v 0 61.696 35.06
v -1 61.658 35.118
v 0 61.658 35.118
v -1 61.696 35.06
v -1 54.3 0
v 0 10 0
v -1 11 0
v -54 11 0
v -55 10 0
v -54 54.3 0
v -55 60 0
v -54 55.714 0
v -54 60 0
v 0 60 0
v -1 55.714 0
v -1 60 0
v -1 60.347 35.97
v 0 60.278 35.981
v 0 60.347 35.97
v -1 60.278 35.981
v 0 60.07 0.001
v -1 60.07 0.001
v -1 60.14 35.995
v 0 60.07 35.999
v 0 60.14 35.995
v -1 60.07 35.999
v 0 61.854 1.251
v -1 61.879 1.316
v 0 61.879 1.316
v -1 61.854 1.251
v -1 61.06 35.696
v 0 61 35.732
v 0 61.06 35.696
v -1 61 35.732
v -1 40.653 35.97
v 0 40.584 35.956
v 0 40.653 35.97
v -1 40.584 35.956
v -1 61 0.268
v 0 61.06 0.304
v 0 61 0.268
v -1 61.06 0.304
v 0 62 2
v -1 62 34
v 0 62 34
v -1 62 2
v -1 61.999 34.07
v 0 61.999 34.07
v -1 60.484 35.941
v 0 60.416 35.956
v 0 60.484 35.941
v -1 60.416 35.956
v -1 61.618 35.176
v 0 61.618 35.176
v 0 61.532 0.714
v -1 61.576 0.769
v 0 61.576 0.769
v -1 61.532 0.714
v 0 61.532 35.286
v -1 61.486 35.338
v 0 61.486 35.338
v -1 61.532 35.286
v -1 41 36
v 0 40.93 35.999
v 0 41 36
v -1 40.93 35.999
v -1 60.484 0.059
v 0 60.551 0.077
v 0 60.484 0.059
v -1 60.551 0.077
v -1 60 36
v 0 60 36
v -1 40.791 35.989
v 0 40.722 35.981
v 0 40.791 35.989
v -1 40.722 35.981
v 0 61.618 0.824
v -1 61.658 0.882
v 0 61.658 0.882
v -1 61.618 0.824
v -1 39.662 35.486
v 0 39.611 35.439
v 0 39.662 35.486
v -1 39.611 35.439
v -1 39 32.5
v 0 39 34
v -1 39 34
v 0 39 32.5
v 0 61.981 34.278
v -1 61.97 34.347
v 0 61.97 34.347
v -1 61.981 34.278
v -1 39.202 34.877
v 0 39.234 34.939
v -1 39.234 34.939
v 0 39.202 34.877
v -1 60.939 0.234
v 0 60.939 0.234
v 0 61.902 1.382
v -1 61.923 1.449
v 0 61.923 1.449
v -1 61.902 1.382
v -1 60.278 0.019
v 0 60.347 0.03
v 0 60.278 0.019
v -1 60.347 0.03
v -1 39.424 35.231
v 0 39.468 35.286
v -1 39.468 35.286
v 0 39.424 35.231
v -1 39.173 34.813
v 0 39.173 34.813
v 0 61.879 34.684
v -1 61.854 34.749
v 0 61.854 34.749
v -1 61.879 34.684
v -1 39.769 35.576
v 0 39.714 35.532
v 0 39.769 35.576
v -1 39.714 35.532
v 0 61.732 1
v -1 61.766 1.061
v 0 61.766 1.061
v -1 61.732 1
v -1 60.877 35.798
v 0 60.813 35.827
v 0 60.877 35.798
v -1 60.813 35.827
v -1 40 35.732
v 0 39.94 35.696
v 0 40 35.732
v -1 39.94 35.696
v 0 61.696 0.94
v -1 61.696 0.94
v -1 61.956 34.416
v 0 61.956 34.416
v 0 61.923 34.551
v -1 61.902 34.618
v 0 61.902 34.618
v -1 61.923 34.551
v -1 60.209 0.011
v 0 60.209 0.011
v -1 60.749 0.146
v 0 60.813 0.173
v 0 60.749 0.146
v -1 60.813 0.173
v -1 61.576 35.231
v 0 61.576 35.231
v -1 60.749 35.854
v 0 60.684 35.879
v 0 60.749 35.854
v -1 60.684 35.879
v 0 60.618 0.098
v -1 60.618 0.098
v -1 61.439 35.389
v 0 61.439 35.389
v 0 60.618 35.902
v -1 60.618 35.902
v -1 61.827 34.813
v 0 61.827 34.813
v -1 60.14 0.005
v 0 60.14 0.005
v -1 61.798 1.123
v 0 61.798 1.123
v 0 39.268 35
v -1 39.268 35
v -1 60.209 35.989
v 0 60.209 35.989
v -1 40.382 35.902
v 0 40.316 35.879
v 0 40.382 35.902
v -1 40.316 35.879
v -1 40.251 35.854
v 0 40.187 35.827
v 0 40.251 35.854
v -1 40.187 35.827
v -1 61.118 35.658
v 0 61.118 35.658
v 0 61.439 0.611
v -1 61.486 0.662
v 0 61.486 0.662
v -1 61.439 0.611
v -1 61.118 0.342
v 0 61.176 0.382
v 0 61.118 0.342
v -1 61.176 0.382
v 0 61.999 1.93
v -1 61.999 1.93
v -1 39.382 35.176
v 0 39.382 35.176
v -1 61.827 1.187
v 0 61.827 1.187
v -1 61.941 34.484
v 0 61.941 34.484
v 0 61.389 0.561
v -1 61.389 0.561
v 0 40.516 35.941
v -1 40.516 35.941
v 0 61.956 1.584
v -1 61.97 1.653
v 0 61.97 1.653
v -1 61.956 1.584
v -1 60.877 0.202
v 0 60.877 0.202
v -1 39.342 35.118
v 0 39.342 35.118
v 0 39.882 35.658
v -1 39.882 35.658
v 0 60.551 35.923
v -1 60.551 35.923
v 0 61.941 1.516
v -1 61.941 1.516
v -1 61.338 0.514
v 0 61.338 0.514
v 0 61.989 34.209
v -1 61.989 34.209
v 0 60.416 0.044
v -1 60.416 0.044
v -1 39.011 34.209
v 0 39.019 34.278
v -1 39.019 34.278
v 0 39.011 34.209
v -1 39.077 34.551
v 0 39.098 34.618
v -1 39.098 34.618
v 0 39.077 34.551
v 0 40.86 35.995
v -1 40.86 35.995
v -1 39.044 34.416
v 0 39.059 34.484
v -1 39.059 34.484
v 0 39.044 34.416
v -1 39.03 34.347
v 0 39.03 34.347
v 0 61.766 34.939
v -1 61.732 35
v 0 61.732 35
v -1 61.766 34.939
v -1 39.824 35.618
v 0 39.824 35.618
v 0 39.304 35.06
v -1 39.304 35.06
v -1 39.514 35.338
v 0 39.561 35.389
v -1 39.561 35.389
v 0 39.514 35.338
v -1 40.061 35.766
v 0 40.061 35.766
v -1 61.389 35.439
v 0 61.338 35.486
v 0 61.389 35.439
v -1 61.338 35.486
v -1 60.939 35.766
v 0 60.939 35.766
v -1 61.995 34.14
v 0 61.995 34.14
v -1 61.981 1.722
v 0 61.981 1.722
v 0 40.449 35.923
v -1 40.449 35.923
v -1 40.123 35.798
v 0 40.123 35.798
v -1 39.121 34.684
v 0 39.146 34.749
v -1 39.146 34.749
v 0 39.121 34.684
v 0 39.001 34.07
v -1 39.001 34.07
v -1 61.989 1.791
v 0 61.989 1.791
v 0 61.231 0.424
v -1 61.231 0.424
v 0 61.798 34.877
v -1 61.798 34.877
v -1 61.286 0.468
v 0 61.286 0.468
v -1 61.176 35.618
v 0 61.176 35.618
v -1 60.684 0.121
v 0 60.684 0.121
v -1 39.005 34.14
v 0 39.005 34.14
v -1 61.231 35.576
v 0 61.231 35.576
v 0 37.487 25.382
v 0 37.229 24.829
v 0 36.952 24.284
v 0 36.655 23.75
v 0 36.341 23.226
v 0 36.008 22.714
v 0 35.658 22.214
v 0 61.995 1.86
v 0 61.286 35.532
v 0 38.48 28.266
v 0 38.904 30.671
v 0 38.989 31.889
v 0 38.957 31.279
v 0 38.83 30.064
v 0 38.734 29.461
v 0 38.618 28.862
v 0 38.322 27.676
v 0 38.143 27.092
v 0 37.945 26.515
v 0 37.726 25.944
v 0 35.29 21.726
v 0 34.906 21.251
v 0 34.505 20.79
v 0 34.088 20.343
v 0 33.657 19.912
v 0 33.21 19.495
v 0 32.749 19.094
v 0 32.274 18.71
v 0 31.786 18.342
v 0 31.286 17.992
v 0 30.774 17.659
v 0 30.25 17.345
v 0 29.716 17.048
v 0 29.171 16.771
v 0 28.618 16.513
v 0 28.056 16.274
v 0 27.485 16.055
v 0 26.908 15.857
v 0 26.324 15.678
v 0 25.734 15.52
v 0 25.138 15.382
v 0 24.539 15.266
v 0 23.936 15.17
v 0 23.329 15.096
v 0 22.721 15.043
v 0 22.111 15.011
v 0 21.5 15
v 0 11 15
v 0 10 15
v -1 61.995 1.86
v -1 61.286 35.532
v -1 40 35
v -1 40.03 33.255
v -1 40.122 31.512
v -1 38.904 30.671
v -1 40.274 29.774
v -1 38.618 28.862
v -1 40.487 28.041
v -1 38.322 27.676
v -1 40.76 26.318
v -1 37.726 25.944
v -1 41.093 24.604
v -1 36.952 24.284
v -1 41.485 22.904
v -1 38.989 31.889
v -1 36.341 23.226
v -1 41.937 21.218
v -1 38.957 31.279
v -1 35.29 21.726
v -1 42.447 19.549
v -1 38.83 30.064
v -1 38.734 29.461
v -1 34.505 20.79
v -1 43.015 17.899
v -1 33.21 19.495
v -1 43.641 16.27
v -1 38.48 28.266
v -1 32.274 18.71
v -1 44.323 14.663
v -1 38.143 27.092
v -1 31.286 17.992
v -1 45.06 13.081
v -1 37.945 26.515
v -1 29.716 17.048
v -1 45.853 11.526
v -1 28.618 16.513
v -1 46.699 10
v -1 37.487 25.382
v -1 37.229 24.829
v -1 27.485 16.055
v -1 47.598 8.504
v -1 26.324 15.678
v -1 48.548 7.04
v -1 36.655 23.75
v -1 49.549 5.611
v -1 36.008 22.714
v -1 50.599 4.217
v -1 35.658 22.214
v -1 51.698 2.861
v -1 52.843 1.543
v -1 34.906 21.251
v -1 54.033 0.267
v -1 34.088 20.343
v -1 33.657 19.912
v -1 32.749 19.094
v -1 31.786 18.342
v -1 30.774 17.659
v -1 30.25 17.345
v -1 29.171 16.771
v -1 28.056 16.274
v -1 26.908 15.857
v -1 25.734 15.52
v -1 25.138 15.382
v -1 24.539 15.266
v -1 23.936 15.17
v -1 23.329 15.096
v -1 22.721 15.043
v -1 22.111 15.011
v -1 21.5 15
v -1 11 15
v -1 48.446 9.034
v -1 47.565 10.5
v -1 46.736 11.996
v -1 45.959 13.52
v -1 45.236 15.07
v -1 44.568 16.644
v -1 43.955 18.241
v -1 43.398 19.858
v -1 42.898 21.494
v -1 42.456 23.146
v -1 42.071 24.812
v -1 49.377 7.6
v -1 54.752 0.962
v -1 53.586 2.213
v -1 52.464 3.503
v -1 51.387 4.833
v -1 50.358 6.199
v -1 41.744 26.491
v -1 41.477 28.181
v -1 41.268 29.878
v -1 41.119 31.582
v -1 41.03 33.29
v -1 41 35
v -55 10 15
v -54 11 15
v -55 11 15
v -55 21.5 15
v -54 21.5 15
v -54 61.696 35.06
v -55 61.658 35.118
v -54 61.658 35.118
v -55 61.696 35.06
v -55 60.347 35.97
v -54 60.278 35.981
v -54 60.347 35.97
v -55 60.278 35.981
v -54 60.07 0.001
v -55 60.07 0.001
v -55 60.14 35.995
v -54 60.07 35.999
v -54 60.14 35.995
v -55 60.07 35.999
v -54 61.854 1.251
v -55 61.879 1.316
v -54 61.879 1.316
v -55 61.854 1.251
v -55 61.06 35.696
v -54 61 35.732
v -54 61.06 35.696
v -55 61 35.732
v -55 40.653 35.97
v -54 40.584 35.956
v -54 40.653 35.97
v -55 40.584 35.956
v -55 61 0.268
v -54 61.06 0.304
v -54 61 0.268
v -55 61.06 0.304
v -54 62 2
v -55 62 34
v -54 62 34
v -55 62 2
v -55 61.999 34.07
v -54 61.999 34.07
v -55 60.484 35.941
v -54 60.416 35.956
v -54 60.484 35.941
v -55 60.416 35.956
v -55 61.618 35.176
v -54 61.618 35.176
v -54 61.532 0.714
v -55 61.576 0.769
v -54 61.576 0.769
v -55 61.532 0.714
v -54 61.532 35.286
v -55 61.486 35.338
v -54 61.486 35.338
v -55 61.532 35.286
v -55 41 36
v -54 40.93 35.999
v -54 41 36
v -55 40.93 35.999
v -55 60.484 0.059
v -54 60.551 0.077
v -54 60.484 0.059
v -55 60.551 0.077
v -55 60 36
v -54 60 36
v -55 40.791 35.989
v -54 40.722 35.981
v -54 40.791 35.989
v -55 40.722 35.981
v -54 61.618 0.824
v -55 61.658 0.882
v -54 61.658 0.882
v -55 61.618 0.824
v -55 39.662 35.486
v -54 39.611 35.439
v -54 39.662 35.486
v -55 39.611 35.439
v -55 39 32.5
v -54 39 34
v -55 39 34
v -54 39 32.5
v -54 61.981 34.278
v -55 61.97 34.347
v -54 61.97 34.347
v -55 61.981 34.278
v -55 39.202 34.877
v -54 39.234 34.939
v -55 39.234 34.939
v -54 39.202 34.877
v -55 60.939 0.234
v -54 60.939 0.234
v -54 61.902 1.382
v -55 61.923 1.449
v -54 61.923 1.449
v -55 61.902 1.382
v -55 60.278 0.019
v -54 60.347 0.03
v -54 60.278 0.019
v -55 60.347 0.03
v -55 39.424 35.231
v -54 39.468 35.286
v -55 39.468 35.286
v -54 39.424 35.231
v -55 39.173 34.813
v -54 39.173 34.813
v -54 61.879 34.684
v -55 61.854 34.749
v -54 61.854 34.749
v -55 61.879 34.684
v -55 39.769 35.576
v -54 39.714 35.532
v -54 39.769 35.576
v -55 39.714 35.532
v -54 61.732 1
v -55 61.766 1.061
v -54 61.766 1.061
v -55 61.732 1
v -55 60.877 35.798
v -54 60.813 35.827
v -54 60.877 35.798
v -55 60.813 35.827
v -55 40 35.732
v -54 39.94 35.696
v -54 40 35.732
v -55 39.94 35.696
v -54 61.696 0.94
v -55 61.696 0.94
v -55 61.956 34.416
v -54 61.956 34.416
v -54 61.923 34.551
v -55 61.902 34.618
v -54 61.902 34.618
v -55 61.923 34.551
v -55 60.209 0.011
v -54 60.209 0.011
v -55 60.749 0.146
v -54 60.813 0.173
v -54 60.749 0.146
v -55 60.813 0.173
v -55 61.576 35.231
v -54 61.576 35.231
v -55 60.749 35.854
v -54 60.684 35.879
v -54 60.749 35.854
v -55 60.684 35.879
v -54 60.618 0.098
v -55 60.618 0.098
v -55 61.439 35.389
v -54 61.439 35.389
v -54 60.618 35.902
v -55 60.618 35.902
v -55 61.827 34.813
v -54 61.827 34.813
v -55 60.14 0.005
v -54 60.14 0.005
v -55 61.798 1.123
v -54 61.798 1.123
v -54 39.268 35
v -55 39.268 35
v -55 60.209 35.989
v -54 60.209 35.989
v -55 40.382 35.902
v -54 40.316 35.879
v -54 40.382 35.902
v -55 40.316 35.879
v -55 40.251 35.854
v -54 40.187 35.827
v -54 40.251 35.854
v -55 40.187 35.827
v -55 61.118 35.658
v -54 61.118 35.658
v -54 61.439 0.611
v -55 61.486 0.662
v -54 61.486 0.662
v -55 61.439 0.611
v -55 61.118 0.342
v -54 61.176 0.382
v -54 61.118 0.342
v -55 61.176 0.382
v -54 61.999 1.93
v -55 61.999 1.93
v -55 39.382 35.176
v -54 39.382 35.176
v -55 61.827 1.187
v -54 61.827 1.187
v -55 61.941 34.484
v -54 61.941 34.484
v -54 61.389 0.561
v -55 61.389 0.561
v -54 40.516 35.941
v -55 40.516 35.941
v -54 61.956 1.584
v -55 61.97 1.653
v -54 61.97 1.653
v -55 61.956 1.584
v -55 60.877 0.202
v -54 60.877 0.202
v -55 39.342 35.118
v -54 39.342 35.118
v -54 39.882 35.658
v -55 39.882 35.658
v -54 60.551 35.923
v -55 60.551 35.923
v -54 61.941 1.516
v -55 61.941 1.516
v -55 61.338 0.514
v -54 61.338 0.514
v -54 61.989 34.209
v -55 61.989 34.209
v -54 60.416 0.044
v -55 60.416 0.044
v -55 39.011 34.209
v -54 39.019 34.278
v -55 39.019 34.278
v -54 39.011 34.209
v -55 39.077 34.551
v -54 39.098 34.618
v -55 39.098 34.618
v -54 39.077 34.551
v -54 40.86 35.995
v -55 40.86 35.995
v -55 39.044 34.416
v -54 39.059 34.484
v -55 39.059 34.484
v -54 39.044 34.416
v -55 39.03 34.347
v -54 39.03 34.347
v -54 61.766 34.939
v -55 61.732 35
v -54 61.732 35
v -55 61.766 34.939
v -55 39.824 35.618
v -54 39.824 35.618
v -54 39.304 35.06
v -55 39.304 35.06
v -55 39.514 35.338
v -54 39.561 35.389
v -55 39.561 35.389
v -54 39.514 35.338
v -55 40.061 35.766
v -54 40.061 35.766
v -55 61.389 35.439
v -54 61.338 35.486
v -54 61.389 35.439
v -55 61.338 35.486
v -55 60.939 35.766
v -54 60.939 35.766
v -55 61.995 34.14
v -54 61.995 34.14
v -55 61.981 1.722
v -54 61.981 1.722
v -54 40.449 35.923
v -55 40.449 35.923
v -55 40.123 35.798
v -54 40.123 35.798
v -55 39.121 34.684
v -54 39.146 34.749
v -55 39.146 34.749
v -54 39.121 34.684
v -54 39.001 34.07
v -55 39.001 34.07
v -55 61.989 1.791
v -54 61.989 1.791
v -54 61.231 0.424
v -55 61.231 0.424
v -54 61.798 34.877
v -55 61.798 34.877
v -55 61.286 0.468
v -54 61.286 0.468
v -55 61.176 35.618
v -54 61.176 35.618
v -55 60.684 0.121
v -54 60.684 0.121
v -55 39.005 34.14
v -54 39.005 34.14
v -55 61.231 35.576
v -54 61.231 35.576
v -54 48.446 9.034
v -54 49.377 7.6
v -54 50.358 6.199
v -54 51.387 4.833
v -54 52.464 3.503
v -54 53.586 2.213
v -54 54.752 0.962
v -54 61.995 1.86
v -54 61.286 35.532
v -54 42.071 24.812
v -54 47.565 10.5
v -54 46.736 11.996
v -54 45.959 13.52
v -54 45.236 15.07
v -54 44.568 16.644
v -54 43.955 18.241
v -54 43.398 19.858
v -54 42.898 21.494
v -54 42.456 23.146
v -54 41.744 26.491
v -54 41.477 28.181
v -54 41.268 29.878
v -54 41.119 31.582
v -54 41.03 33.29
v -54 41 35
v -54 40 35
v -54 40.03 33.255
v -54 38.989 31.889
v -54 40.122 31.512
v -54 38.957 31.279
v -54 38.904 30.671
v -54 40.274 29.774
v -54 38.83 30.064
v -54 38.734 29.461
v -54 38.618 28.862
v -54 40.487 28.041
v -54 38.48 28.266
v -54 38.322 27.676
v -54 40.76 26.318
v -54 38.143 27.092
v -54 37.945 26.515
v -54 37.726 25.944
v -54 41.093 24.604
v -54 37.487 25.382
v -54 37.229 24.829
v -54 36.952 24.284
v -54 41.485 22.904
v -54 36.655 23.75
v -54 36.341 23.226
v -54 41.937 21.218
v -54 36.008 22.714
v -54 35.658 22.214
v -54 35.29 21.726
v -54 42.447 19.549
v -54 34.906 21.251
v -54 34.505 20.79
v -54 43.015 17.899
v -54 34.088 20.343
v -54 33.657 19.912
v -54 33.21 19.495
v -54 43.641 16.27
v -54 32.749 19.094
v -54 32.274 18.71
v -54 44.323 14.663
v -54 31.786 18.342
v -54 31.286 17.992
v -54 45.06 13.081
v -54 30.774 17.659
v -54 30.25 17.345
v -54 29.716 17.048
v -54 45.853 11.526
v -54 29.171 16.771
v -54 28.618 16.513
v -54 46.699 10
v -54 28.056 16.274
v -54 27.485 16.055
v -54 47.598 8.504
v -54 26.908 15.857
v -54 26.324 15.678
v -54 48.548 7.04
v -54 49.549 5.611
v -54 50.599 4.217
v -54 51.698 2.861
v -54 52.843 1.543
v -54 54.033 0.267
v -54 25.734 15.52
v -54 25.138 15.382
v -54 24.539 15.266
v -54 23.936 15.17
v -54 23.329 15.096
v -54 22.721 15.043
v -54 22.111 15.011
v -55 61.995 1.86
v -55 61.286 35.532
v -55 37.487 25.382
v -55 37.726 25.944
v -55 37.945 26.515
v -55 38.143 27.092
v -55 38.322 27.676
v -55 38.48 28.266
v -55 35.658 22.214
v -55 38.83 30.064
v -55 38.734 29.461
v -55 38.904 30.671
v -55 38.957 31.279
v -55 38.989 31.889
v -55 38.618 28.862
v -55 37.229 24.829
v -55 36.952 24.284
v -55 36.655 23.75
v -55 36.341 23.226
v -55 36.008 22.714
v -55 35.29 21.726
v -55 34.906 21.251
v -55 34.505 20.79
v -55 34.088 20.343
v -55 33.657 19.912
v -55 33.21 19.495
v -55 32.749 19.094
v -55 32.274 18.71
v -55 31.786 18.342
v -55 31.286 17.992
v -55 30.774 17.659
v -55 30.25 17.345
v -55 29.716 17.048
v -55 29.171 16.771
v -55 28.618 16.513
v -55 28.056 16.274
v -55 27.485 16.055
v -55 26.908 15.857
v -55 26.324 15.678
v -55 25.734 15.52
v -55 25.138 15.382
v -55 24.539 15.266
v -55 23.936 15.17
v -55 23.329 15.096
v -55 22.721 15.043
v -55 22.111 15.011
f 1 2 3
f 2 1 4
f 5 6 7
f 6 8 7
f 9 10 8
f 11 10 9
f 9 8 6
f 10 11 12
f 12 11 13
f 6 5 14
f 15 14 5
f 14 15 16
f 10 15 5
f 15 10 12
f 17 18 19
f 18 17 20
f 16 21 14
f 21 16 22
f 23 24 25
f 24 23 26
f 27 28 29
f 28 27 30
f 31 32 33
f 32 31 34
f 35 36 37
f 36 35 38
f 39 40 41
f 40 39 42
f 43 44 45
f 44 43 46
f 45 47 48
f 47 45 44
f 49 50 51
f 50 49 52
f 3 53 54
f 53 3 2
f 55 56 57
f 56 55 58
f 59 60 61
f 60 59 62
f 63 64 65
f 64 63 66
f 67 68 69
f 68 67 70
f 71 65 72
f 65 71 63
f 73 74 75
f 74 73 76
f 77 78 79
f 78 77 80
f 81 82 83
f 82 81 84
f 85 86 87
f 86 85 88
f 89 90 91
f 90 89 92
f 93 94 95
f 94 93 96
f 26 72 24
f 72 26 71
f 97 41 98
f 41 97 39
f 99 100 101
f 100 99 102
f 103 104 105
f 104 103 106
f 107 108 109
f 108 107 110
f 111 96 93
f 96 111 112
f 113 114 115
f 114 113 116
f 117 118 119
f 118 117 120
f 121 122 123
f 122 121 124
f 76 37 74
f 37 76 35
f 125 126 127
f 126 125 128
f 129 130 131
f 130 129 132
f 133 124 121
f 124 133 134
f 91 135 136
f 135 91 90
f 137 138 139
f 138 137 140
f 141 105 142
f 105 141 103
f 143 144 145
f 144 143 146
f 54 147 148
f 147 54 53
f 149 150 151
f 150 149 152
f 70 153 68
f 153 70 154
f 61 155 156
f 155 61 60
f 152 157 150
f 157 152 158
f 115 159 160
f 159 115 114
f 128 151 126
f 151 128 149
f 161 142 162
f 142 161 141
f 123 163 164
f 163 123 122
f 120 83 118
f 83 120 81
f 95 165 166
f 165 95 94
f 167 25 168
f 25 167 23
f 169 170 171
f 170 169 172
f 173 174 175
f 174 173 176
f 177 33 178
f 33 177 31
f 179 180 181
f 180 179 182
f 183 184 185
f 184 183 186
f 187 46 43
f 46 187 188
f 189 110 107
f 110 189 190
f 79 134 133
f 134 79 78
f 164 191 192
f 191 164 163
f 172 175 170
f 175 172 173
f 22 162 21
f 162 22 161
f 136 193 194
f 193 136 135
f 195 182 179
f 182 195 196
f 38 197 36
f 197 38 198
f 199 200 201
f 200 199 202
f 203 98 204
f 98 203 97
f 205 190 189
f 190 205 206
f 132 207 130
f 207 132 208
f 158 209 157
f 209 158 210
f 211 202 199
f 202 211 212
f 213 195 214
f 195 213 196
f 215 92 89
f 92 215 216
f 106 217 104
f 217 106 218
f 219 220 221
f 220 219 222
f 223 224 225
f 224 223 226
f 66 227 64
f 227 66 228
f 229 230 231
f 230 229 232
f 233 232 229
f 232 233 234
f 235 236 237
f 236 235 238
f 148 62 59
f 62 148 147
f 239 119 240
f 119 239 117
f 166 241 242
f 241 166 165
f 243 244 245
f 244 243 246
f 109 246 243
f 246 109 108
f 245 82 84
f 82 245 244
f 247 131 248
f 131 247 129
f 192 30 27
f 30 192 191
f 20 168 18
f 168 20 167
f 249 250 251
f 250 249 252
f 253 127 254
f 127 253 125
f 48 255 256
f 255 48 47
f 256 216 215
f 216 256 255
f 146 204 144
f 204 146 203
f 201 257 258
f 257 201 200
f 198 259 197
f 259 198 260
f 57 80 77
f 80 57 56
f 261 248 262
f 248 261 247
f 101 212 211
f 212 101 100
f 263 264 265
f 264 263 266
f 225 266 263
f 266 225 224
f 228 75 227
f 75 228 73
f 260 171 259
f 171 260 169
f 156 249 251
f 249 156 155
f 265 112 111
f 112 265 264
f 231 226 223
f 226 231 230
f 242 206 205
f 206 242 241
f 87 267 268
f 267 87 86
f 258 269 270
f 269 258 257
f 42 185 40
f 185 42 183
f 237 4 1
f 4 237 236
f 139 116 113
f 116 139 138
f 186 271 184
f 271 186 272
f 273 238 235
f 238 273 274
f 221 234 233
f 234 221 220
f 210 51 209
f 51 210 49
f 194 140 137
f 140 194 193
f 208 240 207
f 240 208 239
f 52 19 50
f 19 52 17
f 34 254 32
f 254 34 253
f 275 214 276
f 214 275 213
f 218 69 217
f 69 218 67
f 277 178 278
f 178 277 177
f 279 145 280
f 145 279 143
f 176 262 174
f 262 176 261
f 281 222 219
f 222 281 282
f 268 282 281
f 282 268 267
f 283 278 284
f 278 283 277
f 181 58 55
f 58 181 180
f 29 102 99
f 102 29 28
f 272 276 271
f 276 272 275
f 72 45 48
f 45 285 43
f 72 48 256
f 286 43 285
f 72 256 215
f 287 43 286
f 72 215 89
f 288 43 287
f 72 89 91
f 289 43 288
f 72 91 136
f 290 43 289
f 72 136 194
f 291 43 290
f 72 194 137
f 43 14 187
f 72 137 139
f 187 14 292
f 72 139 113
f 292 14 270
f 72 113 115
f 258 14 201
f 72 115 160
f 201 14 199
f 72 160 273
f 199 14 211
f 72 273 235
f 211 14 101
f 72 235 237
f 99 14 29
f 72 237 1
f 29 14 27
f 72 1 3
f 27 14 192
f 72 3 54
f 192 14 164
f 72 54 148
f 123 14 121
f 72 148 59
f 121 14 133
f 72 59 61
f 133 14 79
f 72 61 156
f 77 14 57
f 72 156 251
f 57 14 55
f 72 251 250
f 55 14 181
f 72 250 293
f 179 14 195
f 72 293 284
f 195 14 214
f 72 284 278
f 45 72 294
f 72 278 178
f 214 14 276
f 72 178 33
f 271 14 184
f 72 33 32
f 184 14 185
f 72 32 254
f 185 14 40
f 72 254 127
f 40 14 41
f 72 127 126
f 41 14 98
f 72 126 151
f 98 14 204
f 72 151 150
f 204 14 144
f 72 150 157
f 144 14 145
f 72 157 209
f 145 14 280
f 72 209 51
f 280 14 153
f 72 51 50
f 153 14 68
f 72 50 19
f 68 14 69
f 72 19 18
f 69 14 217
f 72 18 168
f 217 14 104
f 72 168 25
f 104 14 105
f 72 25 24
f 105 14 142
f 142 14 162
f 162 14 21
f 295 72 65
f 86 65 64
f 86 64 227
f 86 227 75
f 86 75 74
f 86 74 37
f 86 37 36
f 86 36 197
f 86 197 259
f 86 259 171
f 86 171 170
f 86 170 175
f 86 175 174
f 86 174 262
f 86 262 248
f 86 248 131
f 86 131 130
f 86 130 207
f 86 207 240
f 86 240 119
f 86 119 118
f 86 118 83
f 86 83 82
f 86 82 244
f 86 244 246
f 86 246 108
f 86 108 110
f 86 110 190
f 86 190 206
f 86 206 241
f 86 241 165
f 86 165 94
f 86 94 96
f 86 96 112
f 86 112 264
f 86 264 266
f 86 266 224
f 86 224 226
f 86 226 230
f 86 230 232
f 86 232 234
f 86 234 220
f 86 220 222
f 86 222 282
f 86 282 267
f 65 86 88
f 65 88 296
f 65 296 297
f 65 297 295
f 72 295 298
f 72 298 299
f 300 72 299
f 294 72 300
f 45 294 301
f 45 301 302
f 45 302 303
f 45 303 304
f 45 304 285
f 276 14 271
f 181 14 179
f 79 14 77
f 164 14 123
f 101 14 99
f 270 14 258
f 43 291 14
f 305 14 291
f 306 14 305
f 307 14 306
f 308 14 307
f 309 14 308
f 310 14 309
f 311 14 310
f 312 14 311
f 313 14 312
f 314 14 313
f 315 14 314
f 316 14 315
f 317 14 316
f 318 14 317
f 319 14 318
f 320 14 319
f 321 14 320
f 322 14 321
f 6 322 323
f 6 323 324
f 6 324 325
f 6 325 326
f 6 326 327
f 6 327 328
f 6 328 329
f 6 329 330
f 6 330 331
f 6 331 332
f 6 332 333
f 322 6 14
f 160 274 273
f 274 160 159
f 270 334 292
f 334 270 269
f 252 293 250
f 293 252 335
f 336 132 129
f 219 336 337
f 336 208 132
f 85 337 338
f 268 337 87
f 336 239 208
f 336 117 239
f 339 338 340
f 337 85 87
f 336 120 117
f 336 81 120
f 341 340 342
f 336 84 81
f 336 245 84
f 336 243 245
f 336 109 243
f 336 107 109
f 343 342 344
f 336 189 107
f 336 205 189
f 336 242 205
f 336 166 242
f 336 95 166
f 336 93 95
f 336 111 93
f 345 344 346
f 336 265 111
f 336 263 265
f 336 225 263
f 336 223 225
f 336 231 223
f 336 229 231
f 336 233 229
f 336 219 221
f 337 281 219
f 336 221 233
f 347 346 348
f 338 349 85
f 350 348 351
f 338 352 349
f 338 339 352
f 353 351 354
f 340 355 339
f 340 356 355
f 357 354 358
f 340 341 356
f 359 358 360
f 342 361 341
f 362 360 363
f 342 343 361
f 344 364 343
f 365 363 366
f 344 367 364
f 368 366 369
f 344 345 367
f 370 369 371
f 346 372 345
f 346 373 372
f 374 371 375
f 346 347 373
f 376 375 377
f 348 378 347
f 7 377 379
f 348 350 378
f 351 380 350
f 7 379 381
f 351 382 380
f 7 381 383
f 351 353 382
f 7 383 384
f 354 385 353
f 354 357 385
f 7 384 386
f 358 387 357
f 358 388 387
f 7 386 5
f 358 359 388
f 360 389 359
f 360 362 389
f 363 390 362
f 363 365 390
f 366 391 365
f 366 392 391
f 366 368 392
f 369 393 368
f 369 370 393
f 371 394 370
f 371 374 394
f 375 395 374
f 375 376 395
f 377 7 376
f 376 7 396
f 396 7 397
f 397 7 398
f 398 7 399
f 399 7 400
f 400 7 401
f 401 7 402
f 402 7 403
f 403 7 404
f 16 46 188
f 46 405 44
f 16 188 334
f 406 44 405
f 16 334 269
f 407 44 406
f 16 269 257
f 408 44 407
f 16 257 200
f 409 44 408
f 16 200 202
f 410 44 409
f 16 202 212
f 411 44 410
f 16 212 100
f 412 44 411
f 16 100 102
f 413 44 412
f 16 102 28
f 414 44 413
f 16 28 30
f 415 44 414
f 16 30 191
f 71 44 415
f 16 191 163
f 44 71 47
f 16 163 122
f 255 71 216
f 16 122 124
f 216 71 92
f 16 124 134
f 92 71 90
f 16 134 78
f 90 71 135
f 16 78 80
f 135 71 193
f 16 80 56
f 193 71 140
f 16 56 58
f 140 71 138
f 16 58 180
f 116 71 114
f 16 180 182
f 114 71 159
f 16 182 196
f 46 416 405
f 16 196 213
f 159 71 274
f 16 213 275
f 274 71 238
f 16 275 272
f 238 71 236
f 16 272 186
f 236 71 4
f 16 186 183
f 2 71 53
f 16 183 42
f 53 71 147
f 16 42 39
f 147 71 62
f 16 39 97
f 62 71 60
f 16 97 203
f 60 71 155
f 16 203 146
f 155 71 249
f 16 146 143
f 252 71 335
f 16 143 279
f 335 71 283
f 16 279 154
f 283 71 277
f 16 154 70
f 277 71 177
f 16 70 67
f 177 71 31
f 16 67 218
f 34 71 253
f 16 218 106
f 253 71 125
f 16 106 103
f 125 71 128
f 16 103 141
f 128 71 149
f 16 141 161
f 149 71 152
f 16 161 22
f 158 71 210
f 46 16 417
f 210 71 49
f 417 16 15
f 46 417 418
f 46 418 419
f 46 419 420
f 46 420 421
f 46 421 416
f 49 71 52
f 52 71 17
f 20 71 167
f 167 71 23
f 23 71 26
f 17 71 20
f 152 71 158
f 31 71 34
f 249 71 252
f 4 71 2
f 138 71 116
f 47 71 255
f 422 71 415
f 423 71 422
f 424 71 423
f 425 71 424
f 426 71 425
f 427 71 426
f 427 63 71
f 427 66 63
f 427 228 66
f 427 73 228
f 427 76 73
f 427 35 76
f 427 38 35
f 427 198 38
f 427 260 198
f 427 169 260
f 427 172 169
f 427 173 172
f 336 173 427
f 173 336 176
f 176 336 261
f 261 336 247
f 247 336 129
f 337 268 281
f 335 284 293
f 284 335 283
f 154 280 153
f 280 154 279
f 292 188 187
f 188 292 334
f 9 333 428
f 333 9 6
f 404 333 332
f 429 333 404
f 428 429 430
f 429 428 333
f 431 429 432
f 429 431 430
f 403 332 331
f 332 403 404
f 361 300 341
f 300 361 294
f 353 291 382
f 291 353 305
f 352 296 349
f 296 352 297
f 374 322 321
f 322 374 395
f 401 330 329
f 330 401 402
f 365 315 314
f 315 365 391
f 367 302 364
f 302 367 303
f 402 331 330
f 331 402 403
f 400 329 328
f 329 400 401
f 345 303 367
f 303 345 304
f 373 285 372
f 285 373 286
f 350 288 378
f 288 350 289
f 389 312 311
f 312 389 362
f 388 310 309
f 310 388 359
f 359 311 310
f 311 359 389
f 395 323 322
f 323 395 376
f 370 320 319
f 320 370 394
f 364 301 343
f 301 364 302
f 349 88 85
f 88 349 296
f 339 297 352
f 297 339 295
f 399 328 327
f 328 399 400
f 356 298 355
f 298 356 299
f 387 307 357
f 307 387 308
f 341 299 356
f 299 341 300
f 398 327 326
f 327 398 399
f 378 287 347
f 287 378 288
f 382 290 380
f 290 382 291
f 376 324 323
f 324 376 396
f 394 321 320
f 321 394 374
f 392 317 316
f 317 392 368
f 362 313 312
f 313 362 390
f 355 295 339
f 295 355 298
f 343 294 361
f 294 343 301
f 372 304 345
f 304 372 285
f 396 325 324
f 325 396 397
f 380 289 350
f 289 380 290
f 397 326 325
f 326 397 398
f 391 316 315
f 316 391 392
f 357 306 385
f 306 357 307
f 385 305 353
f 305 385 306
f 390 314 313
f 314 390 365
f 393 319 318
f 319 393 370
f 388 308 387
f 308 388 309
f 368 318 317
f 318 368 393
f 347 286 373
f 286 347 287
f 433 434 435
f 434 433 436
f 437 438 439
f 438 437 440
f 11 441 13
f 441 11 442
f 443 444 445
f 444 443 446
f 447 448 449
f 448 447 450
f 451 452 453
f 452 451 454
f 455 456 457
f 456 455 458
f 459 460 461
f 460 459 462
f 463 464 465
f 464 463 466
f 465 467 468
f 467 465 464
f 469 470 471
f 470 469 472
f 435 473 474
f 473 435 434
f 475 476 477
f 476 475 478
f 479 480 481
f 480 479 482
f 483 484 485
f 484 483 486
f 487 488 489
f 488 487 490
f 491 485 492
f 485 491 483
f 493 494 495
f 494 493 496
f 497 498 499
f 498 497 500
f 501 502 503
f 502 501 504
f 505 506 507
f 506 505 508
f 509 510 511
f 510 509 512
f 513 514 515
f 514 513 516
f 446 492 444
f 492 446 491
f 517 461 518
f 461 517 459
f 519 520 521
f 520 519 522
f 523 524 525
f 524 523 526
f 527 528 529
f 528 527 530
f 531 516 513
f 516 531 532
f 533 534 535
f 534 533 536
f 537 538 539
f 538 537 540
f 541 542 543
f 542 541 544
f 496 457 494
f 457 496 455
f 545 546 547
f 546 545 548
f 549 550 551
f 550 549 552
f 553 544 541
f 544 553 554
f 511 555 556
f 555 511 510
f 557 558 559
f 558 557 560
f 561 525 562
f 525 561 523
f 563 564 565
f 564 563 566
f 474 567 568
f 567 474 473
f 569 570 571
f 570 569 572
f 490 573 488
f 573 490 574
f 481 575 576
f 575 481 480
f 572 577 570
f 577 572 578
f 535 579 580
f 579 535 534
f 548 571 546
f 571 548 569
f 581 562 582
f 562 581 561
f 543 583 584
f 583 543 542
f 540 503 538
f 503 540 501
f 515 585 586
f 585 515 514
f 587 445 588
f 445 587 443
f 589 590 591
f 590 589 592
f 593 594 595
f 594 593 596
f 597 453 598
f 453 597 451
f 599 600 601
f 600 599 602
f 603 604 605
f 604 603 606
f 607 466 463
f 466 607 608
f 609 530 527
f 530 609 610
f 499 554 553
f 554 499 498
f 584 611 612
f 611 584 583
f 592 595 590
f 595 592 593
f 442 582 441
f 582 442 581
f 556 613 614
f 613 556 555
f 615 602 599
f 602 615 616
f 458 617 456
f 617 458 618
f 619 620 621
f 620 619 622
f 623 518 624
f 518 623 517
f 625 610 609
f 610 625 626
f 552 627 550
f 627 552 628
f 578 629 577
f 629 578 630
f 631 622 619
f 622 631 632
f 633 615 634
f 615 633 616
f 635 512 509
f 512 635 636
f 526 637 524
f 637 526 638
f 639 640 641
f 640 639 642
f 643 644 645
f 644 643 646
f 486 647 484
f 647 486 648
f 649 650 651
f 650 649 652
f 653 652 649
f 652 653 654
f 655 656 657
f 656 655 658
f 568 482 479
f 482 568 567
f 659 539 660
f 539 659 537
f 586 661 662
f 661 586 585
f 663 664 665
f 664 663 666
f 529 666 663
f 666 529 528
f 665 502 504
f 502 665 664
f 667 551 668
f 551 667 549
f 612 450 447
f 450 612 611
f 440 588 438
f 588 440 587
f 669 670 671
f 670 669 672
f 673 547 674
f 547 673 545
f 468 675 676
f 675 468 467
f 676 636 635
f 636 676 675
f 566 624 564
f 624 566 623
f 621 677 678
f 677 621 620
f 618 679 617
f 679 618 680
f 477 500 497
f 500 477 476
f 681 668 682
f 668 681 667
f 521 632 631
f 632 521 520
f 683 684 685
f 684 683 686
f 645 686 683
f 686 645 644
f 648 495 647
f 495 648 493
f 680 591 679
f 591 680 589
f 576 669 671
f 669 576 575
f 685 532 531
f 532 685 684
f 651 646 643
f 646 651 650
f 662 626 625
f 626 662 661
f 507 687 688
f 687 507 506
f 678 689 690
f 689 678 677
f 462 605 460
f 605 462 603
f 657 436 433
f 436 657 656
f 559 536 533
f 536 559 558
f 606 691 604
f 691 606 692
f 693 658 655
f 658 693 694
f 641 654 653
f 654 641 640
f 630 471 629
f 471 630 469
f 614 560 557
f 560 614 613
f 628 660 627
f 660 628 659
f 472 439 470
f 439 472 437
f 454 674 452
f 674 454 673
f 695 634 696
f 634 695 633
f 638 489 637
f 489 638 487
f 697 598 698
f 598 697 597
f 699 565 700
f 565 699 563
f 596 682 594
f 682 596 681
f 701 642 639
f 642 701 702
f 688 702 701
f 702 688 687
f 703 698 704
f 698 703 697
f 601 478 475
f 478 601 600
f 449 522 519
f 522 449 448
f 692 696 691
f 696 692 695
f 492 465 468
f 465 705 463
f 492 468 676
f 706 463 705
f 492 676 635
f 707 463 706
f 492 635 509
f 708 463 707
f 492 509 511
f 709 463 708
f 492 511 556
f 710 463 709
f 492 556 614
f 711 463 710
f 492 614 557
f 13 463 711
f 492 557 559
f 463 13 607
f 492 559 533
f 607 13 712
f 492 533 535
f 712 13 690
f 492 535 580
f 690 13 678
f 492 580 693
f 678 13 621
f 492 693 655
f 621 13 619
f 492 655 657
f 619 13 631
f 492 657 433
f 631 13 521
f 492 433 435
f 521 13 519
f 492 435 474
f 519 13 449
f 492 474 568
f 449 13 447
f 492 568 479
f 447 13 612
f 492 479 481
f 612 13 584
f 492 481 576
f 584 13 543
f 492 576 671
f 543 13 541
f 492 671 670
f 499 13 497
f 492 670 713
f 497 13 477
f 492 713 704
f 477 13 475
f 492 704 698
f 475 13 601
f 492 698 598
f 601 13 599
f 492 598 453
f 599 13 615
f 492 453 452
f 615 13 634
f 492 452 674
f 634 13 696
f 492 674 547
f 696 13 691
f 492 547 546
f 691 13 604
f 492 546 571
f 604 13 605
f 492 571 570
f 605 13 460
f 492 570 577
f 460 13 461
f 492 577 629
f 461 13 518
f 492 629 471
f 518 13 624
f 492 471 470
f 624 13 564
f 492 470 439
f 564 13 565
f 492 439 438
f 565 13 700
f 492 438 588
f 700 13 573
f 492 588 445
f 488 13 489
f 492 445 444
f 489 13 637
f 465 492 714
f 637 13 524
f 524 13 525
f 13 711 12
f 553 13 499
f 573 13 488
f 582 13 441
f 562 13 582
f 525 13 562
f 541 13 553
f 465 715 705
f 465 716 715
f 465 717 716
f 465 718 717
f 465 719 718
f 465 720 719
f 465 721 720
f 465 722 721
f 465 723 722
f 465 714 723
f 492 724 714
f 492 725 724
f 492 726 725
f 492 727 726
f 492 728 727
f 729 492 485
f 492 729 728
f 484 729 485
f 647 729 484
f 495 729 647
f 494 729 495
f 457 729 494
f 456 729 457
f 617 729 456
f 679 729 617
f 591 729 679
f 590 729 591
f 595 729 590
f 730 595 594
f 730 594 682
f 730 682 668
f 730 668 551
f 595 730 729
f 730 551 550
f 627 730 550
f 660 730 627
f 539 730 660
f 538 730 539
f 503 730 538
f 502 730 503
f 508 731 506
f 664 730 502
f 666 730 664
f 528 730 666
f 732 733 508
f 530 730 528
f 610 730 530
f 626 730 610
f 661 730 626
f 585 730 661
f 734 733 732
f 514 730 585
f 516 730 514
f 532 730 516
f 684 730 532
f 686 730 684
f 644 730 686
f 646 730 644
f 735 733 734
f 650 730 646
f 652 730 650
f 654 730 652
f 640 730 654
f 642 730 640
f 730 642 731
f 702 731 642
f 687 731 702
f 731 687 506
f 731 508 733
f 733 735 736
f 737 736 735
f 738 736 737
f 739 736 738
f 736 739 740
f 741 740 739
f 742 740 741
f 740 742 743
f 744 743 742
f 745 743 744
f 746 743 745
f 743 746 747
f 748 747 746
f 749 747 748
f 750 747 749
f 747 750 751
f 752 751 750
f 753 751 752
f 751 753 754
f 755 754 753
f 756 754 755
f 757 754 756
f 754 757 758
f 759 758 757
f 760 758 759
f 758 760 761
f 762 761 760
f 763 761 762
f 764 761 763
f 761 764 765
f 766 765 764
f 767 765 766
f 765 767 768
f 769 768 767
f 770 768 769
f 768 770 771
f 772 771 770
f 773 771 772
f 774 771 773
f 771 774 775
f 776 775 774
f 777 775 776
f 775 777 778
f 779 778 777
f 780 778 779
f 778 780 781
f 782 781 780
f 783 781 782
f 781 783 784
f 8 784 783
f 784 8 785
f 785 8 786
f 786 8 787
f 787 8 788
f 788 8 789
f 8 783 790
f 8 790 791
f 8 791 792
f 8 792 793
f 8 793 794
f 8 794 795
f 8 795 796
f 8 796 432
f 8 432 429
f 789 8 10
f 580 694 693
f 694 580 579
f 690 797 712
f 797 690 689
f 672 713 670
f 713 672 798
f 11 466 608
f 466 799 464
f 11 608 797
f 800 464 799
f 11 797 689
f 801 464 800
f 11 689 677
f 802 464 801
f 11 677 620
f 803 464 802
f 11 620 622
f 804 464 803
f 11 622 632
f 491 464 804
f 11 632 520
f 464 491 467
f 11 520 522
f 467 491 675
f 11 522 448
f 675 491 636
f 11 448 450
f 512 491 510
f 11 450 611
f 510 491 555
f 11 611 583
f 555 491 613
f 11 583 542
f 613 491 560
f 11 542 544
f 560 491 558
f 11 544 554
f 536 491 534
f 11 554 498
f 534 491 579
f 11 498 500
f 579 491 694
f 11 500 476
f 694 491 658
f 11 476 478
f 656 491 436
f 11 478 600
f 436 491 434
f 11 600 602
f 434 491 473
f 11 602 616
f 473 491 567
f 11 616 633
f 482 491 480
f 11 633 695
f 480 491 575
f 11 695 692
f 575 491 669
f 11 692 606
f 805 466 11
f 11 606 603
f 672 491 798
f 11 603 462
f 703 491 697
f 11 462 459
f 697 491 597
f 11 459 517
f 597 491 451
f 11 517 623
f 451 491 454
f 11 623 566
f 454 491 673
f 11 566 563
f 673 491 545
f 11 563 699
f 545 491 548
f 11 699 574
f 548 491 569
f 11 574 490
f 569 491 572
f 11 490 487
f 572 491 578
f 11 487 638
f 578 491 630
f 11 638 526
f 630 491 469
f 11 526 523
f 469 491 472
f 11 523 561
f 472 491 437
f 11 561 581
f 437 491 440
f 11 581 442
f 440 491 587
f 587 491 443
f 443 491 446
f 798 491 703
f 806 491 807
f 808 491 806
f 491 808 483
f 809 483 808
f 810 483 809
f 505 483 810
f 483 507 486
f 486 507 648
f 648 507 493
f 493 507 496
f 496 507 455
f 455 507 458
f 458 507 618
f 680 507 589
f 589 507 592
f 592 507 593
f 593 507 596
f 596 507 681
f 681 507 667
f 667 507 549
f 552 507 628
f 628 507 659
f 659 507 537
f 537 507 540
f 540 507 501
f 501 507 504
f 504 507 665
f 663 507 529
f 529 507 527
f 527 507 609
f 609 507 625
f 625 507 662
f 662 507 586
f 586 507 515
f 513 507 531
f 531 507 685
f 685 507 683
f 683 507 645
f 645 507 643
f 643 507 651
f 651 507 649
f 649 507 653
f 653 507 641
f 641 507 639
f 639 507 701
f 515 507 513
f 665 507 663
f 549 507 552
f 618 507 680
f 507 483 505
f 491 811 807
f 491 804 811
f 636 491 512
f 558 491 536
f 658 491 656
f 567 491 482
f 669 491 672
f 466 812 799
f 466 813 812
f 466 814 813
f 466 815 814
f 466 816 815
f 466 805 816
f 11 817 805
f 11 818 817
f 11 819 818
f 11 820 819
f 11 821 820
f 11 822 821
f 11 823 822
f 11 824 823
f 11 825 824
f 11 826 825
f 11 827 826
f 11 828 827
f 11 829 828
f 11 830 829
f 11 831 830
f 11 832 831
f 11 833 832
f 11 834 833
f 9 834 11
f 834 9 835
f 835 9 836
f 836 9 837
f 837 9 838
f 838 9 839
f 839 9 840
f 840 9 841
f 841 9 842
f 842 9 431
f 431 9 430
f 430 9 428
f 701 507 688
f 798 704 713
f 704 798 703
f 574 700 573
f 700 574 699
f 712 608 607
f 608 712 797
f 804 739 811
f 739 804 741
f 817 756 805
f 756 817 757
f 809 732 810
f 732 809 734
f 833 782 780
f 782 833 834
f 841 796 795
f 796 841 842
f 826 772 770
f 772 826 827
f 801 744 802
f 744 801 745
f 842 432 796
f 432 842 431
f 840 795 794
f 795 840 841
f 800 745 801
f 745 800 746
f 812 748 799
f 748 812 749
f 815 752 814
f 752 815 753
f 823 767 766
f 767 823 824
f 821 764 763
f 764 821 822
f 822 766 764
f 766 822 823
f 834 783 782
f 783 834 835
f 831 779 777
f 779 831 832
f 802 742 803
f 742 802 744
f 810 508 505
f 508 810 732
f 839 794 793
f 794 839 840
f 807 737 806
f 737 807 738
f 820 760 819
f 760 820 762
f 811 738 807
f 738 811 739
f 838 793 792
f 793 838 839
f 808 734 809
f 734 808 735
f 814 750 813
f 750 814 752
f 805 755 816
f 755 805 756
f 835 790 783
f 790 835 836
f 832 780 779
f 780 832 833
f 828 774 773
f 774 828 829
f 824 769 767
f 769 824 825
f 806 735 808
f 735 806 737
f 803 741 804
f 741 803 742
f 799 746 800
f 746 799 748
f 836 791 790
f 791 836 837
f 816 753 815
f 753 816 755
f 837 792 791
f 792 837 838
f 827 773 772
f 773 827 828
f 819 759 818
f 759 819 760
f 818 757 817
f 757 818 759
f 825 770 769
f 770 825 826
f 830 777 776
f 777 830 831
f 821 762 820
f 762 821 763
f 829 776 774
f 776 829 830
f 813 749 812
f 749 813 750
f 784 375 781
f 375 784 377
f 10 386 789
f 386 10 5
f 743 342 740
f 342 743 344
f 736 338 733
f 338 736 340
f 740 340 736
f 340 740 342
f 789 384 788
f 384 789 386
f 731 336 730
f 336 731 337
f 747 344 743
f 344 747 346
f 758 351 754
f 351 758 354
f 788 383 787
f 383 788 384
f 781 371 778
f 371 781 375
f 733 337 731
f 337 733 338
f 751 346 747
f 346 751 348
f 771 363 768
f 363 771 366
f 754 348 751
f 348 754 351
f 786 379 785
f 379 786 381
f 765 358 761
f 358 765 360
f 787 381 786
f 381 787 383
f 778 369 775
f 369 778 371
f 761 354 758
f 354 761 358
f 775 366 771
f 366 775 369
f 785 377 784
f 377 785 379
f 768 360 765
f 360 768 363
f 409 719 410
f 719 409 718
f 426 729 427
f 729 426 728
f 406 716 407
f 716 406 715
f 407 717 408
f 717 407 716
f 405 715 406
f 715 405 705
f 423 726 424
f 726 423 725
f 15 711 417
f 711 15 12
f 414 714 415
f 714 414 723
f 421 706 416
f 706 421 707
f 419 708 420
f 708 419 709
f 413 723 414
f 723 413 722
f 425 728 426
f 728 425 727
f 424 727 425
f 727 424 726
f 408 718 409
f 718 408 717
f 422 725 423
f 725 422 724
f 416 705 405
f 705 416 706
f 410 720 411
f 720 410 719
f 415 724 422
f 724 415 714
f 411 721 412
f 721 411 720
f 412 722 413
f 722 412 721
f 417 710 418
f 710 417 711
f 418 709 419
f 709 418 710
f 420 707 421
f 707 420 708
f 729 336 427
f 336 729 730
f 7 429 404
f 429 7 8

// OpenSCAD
rotate([0,-90,0])
{
$fn=180;

difference(){
union(){
translate([2,41,0])
minkowski()
{
 cube([32,19,.5]);
 cylinder(r=2,h=.5);
}
translate([0,10,0])cube([32.5,32,1]);
}
translate([15,-1,-1])cube([25,22.5,3]);
translate([32.5,21.5,-1])cylinder(d=35,h=3);
}

translate([0,0,54])
difference(){
union(){
translate([2,41,0])
minkowski()
{
 cube([32,19,.5]);
 cylinder(r=2,h=.5);
}
translate([0,10,0])cube([32.5,32,1]);
}
translate([15,-1,-1])cube([25,22.5,3]);
translate([32.5,21.5,-1])cylinder(d=35,h=3);
}

translate([0,0,55])
rotate([0,180,0])
translate([-35,90,0])
difference(){
cylinder(r=50,h=55);
translate([0,0,-1])cylinder(r=49,h=57);
translate([-100,0,0])cube([200,200,200],center=true);
translate([135,0,0])cube([200,200,200],center=true);
translate([0,100,0])cube([200,200,200],center=true);    
}

translate([0,10,0])cube([15,1,55]);
}
